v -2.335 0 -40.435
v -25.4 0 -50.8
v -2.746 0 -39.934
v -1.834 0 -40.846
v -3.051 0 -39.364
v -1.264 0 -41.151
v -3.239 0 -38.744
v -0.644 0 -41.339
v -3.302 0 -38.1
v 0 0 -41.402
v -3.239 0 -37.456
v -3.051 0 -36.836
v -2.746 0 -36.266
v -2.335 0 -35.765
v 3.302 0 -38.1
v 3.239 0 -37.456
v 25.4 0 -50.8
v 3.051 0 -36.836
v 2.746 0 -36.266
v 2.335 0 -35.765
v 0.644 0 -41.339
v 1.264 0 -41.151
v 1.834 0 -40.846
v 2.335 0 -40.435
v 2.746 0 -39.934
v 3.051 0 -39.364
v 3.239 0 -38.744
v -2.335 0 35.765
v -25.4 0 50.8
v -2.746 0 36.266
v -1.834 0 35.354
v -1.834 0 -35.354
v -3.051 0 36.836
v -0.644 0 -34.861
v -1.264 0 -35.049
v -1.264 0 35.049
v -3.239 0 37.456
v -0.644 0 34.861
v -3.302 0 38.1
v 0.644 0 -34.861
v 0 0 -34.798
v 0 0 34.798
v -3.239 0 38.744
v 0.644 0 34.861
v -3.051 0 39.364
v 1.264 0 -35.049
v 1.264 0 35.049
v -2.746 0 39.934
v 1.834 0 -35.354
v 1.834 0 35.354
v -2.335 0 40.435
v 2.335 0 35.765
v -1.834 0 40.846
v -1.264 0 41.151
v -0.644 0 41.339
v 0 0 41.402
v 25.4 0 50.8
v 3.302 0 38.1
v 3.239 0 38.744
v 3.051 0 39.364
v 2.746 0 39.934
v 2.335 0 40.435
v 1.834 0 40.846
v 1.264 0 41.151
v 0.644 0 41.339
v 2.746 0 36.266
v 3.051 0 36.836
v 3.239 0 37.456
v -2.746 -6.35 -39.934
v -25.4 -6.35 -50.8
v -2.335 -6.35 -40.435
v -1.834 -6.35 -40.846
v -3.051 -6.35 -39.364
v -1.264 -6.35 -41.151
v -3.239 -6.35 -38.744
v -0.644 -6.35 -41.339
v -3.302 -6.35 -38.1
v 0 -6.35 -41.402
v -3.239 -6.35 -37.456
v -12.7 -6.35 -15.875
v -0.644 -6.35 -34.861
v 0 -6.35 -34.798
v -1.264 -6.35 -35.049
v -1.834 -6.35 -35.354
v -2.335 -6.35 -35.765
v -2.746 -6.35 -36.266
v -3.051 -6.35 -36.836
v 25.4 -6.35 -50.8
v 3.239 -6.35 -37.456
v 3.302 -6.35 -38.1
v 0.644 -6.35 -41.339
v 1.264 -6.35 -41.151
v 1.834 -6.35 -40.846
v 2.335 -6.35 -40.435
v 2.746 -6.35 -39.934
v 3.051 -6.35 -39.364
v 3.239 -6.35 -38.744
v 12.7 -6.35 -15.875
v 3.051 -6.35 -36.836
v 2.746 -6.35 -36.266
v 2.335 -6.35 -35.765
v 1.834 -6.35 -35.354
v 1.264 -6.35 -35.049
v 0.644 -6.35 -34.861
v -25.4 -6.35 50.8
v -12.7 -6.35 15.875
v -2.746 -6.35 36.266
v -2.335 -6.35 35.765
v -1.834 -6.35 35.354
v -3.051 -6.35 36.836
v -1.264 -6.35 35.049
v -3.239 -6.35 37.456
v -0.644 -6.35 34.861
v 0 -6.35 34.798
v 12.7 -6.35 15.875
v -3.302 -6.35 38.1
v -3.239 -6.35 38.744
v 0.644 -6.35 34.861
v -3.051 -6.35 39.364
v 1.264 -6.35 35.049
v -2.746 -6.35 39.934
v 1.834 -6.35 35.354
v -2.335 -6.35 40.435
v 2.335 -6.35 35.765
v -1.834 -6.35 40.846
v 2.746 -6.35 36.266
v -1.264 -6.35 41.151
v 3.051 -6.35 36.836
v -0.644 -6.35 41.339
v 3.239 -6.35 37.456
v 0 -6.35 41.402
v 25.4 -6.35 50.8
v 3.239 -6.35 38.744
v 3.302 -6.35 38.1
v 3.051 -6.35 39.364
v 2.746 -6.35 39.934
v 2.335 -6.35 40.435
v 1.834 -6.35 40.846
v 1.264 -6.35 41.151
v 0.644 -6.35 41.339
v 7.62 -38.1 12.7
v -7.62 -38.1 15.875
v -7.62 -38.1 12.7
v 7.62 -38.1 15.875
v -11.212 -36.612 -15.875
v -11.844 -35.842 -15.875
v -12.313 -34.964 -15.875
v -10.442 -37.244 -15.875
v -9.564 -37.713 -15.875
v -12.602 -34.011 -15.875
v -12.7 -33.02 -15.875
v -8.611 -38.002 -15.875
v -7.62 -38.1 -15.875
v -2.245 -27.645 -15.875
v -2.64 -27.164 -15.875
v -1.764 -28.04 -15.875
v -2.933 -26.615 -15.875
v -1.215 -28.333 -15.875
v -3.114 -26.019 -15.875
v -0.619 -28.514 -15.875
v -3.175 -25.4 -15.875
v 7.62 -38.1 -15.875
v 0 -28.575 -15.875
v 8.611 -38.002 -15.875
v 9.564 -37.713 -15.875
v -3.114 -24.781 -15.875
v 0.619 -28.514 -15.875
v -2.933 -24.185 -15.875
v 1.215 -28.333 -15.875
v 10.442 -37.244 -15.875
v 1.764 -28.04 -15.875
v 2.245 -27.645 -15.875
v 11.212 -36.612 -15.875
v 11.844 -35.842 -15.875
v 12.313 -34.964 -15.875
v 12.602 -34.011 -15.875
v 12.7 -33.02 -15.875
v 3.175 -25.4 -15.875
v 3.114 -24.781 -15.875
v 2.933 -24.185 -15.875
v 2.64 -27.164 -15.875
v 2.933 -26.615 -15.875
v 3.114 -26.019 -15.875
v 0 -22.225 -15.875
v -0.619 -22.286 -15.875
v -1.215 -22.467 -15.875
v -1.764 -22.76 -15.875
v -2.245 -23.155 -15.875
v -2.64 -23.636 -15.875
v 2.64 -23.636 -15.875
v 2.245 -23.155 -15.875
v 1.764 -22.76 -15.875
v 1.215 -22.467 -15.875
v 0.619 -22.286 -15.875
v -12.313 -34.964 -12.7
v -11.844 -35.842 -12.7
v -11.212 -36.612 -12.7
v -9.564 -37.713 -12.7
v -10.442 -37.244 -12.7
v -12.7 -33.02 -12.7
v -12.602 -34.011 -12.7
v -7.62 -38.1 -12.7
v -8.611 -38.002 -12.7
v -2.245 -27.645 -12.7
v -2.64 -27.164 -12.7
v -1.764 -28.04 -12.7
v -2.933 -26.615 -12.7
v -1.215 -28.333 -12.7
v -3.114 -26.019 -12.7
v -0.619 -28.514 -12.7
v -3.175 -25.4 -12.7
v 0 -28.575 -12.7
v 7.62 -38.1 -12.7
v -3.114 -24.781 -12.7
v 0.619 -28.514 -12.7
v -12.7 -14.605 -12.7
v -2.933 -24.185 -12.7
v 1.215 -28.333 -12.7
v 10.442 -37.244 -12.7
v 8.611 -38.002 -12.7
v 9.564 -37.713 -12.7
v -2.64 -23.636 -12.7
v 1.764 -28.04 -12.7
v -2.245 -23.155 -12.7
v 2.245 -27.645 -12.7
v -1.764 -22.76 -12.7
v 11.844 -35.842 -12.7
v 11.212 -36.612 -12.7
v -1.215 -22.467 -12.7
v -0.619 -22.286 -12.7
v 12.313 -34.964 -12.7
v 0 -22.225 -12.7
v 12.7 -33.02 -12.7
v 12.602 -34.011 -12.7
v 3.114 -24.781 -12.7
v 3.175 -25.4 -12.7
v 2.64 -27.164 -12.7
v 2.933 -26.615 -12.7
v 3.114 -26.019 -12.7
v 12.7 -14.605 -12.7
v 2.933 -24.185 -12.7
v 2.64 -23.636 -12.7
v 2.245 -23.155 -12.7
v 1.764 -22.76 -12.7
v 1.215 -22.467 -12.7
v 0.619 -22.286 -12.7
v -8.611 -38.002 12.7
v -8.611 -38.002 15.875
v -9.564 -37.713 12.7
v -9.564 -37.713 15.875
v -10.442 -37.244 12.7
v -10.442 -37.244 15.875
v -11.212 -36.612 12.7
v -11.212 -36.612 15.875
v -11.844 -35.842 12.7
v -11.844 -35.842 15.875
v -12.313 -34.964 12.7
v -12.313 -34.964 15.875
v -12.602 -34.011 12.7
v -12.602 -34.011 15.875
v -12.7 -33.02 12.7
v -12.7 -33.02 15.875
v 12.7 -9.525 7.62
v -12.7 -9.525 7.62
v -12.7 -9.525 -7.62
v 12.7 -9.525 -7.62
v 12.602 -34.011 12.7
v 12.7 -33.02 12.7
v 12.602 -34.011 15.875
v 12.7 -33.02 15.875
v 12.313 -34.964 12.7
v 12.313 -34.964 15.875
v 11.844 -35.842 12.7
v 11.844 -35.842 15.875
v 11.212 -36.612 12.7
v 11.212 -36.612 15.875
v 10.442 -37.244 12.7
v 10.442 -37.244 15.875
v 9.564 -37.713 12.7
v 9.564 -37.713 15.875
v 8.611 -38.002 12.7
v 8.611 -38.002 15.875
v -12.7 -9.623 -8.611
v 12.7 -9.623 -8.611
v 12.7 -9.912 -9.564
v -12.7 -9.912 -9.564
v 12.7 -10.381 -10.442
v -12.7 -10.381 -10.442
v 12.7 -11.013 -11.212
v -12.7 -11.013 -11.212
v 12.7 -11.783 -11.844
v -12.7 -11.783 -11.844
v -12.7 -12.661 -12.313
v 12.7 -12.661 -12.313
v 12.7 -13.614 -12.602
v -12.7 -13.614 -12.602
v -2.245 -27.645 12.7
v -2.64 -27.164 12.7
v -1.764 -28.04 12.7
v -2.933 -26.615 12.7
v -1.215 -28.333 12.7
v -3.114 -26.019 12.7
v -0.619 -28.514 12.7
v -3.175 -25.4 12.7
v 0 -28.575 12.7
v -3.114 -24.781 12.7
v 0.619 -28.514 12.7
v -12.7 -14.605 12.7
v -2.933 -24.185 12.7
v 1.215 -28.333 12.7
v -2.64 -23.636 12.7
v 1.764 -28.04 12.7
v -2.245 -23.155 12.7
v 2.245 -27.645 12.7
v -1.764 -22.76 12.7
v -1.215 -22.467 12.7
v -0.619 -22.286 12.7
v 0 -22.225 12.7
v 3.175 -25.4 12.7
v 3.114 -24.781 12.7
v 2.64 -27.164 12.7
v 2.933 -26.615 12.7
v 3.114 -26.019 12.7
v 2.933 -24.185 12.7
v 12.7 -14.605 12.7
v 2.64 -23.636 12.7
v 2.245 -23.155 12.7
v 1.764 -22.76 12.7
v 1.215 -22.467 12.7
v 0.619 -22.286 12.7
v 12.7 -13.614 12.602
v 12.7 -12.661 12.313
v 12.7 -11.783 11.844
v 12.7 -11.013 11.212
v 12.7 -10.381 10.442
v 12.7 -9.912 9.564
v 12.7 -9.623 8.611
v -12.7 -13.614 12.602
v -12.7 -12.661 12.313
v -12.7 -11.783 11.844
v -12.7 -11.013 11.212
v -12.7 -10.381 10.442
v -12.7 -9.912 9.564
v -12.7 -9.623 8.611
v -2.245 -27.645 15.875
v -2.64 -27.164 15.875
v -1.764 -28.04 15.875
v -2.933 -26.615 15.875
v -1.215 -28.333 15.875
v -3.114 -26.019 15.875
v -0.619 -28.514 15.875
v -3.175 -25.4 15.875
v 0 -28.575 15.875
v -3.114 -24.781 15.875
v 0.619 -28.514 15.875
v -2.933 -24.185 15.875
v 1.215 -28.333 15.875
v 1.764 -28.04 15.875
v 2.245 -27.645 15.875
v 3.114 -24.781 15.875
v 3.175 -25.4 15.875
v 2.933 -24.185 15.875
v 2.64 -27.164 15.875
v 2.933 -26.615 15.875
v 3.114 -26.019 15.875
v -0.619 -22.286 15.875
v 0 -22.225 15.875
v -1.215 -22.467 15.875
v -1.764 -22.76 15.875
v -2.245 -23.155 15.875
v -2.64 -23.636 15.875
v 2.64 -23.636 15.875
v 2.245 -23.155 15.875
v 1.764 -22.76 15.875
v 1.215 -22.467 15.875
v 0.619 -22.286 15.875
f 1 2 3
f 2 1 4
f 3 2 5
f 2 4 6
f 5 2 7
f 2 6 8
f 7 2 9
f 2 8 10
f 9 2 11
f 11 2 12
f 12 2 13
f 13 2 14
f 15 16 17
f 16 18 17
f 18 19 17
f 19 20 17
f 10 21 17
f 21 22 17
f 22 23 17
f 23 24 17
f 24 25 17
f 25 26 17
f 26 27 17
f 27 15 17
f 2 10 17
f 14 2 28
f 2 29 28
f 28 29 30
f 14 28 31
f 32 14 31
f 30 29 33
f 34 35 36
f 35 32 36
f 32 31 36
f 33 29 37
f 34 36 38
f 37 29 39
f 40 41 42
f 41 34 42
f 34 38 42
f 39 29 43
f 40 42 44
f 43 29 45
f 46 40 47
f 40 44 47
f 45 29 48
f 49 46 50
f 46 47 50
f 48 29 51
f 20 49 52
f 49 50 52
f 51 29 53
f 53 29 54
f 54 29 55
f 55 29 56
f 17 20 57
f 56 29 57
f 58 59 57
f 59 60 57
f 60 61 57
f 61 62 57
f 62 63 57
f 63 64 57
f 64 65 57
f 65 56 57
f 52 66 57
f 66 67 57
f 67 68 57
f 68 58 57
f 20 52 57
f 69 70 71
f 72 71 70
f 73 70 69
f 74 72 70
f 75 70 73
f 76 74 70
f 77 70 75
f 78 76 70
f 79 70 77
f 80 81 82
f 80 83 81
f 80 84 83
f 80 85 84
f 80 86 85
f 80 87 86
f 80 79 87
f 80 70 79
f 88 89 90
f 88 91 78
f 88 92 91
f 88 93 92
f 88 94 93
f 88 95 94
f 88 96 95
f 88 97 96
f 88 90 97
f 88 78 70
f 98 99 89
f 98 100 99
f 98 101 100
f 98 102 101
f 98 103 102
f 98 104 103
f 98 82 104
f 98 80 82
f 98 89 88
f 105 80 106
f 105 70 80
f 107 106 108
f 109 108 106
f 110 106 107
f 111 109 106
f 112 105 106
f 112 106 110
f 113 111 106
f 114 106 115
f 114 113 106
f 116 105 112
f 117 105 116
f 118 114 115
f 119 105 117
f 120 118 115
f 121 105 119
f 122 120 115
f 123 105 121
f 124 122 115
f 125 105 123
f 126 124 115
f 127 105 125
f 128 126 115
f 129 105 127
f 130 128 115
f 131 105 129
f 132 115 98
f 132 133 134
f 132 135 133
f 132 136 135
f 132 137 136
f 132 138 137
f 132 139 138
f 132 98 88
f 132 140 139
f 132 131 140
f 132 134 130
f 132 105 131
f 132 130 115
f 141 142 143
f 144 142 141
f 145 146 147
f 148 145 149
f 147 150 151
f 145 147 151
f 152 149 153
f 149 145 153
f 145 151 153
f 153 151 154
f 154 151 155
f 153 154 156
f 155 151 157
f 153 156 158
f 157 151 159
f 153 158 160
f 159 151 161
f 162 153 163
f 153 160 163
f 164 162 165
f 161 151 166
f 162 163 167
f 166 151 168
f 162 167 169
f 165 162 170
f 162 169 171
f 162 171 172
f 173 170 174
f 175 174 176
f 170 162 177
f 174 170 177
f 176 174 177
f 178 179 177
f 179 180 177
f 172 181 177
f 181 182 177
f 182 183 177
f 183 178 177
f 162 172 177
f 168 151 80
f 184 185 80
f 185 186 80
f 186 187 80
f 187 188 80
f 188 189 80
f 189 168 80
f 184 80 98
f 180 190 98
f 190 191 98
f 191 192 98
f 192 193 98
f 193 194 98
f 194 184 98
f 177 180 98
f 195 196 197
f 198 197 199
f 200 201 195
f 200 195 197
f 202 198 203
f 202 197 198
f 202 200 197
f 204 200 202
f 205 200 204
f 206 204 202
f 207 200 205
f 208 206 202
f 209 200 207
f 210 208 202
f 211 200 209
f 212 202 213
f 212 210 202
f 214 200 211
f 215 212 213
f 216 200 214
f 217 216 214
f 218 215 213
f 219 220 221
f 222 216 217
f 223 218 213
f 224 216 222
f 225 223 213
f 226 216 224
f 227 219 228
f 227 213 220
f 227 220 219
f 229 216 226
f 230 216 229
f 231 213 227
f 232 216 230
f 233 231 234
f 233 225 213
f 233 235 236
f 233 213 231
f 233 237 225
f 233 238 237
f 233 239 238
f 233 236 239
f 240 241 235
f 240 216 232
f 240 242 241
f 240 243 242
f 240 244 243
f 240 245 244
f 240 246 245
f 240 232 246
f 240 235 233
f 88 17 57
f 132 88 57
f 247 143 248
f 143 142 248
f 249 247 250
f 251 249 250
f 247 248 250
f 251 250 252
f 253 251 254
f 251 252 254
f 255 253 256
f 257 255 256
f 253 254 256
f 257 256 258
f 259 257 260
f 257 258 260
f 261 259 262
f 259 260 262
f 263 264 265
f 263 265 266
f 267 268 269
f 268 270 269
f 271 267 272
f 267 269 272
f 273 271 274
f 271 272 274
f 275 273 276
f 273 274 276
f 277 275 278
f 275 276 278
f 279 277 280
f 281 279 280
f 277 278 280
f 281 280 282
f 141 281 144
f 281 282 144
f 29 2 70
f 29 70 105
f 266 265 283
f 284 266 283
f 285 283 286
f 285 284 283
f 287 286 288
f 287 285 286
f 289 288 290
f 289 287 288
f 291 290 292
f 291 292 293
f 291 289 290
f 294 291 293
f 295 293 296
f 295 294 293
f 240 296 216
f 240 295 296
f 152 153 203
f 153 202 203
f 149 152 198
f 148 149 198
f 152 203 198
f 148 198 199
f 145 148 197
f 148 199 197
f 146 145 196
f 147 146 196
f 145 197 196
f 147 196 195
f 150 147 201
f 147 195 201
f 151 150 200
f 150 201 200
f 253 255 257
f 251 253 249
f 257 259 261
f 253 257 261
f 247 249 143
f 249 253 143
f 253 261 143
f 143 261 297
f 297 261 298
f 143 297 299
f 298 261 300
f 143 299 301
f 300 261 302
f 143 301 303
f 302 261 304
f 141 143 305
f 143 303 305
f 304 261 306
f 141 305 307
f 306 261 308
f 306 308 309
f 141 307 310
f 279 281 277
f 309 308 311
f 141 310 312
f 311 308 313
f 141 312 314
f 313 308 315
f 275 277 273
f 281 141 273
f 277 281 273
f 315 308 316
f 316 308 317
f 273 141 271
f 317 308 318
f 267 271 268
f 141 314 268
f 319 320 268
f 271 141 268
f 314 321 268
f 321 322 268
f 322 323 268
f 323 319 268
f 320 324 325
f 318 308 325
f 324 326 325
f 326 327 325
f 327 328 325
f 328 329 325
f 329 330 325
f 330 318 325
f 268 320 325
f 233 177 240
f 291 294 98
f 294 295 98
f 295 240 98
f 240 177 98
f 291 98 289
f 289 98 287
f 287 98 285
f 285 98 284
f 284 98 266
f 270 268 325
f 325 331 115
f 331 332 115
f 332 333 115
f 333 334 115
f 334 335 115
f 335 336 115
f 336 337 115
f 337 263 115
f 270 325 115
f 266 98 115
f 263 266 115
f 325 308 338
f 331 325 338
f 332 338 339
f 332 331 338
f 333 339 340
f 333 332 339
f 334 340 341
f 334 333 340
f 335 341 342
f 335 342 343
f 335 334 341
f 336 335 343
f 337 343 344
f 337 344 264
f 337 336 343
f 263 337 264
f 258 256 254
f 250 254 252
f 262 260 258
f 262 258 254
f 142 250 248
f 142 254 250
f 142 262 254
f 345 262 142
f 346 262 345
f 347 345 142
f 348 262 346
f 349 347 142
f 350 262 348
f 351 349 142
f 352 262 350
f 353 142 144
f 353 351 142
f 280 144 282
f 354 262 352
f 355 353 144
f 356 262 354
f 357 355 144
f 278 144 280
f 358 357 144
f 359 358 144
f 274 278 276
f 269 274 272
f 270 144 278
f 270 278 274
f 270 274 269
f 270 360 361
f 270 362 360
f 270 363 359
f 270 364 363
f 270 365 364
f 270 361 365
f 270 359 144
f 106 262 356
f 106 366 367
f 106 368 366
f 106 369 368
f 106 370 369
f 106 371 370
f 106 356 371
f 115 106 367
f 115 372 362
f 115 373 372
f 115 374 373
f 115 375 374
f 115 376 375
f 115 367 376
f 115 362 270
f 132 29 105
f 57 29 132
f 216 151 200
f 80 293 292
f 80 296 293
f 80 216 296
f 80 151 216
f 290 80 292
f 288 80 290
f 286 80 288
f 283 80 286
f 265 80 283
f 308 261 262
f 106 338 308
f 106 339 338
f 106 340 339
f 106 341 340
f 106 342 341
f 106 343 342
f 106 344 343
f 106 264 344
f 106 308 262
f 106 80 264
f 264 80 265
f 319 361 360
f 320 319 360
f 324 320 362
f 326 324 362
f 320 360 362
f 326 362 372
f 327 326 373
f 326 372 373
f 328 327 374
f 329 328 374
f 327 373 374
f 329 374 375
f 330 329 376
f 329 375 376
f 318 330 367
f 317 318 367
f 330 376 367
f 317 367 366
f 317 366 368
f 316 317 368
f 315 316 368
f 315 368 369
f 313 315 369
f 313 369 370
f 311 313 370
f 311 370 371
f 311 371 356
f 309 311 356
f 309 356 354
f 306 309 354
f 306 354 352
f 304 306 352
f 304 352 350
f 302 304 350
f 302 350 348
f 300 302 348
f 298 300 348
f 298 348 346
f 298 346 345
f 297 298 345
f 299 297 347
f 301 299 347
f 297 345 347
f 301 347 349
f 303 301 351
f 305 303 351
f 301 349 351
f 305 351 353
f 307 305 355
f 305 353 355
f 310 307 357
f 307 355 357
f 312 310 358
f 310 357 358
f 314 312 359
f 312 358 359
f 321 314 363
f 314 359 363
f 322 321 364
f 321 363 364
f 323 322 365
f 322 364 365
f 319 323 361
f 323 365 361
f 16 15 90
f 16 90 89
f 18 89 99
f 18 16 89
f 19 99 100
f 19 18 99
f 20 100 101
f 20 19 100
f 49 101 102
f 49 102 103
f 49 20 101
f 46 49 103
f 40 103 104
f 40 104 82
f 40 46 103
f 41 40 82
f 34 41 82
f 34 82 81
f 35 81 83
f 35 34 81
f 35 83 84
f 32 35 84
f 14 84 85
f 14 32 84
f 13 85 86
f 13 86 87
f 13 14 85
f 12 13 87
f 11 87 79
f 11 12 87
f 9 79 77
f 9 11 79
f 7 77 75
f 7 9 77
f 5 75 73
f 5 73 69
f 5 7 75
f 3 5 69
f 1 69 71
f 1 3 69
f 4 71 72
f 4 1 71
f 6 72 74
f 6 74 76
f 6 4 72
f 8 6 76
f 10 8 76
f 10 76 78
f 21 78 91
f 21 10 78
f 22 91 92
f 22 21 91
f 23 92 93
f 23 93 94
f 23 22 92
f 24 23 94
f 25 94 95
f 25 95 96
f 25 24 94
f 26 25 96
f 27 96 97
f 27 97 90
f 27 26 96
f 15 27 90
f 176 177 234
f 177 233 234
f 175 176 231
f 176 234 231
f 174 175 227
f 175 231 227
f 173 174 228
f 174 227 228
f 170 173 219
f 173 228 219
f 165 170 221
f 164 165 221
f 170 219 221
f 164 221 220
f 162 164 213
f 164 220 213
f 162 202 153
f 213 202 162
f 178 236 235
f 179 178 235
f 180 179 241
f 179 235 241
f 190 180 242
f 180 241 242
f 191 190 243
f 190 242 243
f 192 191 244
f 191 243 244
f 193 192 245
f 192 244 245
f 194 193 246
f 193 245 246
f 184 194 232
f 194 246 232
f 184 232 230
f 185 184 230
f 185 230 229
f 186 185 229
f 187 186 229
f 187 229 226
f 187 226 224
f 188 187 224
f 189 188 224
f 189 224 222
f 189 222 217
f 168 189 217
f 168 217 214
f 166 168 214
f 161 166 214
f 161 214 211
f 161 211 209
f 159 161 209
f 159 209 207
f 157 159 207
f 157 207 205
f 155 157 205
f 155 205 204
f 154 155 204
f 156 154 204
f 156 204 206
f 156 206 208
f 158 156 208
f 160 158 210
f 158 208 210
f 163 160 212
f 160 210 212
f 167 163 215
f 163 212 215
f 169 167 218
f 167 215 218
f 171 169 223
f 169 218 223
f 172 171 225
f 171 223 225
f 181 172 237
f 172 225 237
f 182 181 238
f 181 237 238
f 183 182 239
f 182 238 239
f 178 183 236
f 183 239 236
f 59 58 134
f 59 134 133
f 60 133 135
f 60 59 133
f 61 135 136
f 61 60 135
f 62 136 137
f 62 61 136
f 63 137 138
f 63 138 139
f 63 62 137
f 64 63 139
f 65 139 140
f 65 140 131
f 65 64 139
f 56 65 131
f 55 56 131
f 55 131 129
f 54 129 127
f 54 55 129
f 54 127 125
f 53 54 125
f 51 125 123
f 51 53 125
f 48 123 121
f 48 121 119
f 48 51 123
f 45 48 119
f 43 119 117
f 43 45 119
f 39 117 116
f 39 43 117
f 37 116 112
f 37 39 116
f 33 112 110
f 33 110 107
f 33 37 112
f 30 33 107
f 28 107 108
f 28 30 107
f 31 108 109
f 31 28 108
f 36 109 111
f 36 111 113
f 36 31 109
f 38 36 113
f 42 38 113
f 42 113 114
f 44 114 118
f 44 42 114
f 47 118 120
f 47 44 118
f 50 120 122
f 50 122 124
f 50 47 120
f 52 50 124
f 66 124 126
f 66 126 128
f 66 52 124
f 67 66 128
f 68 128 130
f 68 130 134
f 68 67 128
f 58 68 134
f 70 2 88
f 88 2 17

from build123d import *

# Parameters (mm, degrees)
F0_W     = 50.8
F0_H     = 101.6
F0_R     = 3.302
F1_DEPTH = 6.35
F2_W     = 25.4
F2_H     = 3.175
F3_DEPTH = 31.75
F2_H_2   = 25.4
F4_DEPTH = 3.175
F5_R     = 5.08
F6_R     = 5.08
F7_R     = 3.175
F8_DEPTH = 66.676


with BuildPart() as f1:
    # F0 (on Front) → F1 (new body)
    with BuildSketch(Plane.XZ):
        Rectangle(F0_W, F0_H)
        with Locations((0, -38.1)):
            Circle(F0_R, mode=Mode.SUBTRACT)
        with Locations((0, 38.1)):
            Circle(F0_R, mode=Mode.SUBTRACT)
    extrude(amount=F1_DEPTH)

    # F2 (on face) → F3 (join)
    with BuildSketch(Plane.XZ.offset(6.35)):
        with Locations((0, -14.2875)):
            Rectangle(F2_W, F2_H)
        with Locations((0, 14.2875)):
            Rectangle(F2_W, F2_H)
    extrude(amount=F3_DEPTH)

    # F2 (on face) → F4 (join)
    with BuildSketch(Plane.XZ.offset(6.35)):
        with Locations((0, 14.2875)):
            Rectangle(F2_W, F2_H)
        Rectangle(F2_W, F2_H_2)
        with Locations((0, -14.2875)):
            Rectangle(F2_W, F2_H)
    extrude(amount=F4_DEPTH)

    # F5
    f5_edges = [f1.edges().sort_by_distance(p)[0] for p in [
        (0, -9.525, -12.7),
        (0, -9.525, 12.7),
    ]]
    fillet(f5_edges, radius=F5_R)

    # F6
    f6_edges = [f1.edges().sort_by_distance(p)[0] for p in [
        (12.7, -38.1, 14.2875),
        (-12.7, -38.1, 14.2875),
        (12.7, -38.1, -14.2875),
        (-12.7, -38.1, -14.2875),
    ]]
    fillet(f6_edges, radius=F6_R)

    # F7 (on face) → F8 (cut, through all)
    with BuildSketch(Plane.XY.offset(15.875)):
        with Locations((0, -25.4)):
            Circle(F7_R)
    extrude(amount=-F8_DEPTH, mode=Mode.SUBTRACT)


solid = f1.part
